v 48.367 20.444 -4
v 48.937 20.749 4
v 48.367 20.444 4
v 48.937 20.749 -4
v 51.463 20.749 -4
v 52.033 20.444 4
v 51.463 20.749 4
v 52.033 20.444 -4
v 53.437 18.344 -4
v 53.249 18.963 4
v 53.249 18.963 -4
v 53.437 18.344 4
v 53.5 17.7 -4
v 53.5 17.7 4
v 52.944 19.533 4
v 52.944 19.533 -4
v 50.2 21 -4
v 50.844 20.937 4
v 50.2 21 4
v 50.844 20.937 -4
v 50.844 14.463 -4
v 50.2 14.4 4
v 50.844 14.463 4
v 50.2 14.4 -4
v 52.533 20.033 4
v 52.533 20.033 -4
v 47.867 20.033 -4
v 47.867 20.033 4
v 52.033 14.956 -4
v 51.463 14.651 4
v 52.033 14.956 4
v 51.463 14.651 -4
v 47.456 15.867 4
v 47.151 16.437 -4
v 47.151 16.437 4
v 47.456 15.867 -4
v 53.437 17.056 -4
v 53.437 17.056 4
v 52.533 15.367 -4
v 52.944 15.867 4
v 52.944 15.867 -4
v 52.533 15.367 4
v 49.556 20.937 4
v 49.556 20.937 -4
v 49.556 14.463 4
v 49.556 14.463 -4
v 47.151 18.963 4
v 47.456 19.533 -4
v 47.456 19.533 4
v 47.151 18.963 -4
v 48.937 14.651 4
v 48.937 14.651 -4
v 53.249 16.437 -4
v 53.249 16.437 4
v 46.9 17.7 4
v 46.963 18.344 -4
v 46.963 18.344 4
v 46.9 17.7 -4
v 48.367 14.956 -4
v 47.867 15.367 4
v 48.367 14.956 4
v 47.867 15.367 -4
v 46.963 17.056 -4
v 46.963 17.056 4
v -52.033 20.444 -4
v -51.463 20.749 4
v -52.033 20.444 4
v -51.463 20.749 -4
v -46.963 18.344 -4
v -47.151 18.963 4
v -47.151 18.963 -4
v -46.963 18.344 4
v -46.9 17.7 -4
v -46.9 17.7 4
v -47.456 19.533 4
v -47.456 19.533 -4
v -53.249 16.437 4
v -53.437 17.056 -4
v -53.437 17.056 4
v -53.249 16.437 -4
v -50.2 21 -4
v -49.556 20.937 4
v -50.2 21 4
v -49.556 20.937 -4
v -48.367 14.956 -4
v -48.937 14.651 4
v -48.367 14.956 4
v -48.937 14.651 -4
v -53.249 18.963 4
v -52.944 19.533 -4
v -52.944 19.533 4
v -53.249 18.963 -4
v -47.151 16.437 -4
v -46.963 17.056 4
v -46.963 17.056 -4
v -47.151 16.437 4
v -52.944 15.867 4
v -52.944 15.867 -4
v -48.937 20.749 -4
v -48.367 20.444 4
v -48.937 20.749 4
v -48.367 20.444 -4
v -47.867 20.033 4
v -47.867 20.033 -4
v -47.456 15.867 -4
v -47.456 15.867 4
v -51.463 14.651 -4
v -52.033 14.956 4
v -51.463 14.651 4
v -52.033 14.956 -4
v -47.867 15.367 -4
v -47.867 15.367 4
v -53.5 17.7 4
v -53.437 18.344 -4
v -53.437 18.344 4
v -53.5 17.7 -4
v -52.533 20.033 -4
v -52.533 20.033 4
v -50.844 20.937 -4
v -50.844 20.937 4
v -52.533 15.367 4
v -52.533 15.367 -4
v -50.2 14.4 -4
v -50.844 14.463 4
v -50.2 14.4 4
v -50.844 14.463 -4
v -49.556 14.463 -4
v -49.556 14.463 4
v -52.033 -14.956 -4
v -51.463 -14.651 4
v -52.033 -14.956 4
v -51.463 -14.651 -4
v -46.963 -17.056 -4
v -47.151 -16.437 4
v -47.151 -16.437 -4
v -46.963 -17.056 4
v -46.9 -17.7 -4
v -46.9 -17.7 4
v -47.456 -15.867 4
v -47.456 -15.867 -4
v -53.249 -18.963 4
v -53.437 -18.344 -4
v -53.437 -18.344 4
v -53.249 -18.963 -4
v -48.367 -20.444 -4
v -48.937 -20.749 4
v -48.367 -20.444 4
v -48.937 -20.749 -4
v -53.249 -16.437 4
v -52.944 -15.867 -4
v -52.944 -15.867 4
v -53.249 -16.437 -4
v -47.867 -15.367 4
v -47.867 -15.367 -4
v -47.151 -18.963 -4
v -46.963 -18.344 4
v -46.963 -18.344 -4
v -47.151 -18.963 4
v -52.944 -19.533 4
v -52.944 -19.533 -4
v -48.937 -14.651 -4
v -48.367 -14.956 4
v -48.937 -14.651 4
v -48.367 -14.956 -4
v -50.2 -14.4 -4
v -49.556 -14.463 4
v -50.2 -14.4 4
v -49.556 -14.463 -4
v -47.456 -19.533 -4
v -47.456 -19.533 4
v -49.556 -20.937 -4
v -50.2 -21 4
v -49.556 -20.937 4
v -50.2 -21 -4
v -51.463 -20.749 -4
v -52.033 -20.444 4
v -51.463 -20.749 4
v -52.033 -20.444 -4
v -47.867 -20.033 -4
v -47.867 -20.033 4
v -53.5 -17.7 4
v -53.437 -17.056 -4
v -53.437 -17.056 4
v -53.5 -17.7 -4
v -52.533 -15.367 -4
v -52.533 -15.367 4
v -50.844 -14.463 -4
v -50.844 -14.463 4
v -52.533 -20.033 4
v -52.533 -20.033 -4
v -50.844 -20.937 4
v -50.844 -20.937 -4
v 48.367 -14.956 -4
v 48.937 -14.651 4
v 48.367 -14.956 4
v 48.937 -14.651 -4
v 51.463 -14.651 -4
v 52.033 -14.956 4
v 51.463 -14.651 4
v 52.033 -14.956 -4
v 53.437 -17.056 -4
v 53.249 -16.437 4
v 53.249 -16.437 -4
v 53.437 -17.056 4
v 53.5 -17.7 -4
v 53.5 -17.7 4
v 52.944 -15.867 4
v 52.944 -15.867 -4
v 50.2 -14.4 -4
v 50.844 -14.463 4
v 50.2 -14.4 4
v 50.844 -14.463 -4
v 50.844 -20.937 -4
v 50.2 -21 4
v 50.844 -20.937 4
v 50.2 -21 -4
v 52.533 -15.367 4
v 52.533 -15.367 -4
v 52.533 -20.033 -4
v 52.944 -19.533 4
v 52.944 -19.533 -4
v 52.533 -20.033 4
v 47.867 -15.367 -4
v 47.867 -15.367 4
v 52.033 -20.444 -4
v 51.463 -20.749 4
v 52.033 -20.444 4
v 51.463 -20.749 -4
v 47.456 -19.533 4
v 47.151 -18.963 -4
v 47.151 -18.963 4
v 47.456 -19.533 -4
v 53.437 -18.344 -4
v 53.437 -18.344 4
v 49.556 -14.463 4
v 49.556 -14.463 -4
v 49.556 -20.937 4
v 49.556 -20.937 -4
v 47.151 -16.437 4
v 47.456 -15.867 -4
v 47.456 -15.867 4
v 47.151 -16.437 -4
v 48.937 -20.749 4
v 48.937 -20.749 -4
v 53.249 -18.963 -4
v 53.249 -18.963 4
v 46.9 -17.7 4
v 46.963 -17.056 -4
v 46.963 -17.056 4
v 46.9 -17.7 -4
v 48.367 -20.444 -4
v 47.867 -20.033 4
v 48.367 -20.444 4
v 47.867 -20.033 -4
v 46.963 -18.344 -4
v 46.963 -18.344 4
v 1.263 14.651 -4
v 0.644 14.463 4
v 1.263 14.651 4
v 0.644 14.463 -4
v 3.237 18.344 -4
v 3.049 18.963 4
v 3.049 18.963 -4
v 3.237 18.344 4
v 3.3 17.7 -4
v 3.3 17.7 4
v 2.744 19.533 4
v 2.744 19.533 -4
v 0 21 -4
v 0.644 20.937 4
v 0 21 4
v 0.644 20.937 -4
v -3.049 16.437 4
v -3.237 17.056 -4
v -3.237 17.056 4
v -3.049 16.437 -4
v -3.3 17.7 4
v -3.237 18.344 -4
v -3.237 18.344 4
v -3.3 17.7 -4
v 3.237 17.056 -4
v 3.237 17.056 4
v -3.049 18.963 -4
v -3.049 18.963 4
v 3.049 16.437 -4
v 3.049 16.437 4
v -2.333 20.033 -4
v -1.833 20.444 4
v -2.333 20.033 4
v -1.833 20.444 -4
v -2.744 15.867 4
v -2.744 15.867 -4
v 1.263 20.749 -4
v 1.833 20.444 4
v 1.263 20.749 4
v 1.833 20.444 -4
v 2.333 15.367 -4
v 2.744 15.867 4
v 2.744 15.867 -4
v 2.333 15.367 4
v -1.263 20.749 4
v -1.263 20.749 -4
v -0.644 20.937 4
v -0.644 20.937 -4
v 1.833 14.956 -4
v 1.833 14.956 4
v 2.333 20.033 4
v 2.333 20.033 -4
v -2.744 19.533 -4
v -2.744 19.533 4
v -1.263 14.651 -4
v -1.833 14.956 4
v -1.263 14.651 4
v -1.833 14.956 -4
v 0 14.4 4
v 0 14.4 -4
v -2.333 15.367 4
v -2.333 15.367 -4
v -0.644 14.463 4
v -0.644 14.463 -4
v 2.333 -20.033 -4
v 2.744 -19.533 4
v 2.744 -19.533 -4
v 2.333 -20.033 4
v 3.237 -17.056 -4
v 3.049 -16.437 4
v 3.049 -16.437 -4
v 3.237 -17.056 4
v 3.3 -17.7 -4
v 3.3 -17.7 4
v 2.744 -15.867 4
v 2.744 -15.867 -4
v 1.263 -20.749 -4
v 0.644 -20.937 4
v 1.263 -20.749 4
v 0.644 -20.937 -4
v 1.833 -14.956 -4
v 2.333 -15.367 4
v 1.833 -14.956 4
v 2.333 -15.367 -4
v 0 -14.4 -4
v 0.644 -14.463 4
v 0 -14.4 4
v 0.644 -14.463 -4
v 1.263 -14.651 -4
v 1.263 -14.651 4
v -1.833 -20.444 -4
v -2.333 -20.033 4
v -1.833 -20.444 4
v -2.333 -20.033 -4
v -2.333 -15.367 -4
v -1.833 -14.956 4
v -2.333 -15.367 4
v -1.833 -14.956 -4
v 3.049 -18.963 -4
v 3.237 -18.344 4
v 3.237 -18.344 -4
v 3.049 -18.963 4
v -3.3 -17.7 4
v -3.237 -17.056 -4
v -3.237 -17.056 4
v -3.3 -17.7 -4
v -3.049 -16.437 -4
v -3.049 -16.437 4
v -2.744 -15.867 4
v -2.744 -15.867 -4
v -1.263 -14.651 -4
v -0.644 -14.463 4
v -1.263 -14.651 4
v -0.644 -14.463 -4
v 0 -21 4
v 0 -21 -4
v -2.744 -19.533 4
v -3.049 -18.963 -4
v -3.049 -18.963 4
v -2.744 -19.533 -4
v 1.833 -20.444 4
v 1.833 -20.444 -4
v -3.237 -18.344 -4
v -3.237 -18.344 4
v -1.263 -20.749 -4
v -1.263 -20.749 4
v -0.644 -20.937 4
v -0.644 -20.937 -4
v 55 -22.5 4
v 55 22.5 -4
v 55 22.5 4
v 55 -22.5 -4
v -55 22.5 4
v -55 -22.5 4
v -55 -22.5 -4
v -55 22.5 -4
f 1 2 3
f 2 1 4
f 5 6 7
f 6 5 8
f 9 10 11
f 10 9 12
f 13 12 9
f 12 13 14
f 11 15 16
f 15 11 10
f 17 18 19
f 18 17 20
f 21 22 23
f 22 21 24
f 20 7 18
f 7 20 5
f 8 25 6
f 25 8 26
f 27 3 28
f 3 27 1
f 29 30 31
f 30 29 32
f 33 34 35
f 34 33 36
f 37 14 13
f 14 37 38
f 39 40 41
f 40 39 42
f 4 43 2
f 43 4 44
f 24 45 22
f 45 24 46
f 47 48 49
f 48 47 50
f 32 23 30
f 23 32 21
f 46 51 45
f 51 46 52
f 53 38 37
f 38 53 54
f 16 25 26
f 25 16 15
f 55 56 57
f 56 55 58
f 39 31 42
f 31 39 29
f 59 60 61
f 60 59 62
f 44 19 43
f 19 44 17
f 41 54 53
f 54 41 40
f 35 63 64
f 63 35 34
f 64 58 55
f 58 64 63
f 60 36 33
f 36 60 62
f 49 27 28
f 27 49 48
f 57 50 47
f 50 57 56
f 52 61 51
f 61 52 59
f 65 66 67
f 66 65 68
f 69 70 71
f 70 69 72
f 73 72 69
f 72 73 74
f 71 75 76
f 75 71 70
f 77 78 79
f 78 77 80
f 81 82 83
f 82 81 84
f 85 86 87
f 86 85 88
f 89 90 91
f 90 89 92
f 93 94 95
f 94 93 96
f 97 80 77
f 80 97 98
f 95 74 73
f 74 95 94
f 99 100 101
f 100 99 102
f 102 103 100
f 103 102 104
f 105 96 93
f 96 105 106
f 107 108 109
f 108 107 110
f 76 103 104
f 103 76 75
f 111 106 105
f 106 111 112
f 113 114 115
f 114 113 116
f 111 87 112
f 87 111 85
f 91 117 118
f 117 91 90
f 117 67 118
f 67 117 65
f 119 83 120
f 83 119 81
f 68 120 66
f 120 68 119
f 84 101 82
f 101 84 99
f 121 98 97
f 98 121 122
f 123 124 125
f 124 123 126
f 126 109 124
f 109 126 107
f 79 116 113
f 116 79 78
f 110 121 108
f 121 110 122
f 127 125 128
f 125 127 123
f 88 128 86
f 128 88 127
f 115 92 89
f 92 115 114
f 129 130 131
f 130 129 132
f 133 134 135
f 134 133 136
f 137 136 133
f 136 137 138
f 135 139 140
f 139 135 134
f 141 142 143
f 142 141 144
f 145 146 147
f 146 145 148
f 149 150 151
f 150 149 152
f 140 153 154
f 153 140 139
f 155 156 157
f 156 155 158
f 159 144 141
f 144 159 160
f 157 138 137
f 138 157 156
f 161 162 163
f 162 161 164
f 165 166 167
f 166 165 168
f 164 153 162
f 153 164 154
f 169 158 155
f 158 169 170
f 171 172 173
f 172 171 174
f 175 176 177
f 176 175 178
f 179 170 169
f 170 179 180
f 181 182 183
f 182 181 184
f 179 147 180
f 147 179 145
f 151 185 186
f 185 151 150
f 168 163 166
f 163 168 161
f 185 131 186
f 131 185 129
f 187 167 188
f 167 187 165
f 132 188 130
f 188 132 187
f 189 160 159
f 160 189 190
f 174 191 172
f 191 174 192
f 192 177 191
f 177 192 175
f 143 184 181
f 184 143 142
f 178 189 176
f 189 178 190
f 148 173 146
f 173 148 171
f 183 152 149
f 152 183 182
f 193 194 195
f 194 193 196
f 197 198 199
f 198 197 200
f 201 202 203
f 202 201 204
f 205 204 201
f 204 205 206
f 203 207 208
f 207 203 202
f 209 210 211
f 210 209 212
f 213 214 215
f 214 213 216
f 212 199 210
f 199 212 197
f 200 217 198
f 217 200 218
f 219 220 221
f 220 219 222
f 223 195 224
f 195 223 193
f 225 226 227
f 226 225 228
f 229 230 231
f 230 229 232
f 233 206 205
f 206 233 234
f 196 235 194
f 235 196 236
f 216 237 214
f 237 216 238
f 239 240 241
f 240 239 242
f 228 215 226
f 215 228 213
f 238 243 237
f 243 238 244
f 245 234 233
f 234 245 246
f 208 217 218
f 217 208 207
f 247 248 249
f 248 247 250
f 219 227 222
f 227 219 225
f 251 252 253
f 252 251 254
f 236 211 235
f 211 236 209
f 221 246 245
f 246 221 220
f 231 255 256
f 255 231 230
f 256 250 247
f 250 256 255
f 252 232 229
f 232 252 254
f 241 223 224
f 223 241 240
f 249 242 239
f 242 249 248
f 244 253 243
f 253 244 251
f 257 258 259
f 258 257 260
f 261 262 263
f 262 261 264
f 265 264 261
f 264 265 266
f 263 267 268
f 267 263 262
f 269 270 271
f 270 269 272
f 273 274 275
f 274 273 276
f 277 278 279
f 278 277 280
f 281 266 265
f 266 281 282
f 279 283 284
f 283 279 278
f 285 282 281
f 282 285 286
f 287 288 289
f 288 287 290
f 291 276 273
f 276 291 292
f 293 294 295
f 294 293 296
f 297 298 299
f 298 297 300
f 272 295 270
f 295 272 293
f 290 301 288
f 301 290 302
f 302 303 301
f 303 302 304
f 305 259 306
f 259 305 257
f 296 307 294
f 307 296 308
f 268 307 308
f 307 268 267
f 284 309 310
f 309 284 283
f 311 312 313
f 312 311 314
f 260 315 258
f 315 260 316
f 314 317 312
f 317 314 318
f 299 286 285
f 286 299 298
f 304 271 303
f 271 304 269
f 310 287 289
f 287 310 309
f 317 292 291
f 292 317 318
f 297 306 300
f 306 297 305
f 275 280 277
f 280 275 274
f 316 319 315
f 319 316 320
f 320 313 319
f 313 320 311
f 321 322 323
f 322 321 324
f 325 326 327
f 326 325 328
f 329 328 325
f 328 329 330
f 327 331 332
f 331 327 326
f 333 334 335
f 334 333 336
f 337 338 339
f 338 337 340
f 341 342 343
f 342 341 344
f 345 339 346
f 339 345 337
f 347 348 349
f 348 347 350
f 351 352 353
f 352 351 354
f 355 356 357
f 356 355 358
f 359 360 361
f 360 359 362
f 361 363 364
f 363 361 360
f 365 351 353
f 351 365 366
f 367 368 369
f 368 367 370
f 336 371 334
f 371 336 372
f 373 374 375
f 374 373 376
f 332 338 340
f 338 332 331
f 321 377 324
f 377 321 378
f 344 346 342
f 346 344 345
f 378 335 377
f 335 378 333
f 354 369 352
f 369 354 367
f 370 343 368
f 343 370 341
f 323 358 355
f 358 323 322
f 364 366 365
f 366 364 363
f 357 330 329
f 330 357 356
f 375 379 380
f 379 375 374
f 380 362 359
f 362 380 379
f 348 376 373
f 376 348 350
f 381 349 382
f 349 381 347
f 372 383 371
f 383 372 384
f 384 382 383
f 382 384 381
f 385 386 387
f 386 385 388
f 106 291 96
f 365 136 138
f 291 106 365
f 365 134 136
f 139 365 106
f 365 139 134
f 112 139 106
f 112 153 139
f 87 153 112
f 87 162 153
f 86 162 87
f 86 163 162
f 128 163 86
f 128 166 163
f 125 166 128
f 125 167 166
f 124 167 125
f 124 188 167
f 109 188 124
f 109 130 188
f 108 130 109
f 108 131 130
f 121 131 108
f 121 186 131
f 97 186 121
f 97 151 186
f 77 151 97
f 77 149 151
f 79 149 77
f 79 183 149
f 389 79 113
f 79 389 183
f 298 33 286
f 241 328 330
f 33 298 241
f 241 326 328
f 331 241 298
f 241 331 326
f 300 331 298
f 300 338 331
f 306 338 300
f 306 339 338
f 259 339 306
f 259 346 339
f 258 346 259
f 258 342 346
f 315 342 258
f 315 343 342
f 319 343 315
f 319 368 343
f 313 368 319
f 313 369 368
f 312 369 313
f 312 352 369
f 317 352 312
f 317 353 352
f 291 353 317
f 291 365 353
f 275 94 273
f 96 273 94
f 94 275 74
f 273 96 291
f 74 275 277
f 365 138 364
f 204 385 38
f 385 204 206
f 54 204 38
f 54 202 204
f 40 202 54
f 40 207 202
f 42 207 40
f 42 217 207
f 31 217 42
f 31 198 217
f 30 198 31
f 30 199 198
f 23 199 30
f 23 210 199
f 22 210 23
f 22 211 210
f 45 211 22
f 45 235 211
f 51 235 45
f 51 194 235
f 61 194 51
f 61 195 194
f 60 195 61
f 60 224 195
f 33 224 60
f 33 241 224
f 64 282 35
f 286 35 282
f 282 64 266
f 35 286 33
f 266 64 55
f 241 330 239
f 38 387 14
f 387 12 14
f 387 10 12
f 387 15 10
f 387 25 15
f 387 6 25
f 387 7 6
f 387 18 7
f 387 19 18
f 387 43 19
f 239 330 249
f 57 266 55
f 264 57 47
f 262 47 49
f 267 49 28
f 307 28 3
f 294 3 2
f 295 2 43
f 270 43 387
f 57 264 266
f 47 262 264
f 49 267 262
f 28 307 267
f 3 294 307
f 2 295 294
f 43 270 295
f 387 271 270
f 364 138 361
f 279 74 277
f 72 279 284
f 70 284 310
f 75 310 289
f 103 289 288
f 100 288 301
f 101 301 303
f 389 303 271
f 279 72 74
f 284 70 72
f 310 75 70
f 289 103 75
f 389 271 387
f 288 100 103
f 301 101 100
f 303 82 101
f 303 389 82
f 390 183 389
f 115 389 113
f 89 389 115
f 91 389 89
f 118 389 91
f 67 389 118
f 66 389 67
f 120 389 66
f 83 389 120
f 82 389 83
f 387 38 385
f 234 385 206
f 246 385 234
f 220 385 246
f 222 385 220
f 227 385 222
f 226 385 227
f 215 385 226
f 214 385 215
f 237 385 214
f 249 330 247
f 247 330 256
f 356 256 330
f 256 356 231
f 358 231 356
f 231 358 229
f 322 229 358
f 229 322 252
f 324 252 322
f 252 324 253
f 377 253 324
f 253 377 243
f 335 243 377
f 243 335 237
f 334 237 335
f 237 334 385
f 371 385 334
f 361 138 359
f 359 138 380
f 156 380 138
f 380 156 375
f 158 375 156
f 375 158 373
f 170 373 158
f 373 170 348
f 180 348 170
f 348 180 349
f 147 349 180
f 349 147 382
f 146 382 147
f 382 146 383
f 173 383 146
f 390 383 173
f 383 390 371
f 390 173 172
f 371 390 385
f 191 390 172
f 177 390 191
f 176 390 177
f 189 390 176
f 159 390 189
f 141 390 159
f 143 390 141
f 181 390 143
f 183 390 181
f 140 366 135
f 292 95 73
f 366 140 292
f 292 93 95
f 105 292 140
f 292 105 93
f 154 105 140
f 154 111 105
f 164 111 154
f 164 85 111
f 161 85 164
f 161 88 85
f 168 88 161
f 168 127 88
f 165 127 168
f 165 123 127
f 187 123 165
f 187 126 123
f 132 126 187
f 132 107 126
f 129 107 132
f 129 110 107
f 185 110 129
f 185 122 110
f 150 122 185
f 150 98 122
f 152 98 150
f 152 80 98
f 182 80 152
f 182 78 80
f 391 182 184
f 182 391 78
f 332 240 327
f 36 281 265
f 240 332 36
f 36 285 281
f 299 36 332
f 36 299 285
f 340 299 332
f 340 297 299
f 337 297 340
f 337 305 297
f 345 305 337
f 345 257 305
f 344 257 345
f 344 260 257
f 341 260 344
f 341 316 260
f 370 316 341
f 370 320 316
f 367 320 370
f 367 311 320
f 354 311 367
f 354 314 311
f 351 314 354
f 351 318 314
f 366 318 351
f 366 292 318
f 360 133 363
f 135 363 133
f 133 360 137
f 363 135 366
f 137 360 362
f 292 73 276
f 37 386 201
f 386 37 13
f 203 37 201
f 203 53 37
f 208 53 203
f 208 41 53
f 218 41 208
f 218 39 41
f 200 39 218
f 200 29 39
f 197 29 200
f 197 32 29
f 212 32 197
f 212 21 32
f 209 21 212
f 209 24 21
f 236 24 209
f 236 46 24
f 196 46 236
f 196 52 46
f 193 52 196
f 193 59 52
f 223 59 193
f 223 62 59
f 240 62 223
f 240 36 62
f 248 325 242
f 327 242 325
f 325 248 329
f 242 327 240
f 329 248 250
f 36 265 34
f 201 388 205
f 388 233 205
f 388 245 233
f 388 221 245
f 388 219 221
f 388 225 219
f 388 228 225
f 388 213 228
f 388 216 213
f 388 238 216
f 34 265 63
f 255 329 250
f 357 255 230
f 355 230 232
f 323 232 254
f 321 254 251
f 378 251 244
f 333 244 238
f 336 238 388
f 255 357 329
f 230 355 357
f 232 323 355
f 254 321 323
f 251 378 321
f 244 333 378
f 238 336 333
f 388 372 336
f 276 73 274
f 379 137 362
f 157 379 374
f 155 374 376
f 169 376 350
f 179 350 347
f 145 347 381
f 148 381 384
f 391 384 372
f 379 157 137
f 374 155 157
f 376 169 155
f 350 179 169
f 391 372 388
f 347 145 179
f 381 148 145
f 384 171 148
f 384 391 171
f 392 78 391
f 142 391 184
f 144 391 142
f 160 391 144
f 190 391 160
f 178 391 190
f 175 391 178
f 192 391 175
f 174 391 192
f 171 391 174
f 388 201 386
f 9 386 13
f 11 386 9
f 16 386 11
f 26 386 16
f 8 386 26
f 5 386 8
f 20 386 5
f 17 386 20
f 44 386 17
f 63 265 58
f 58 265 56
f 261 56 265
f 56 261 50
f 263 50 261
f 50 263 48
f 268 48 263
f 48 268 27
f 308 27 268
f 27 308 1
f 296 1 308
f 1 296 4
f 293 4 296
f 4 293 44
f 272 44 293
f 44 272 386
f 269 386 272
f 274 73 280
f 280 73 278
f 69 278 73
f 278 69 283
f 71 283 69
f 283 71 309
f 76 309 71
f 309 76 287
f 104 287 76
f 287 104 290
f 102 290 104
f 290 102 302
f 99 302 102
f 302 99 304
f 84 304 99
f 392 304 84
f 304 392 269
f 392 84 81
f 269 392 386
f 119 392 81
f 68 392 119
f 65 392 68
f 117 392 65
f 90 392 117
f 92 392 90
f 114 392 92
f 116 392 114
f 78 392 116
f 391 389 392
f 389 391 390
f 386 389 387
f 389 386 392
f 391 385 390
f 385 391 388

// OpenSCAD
$fn = 32;

// ----------------------------------------------------------------------
// Corner plate 110 x 45 x 8
// 6 holes, centres taken from the edge offset
// ----------------------------------------------------------------------

// --- parameters (mm) ---
plate = [110, 45, 8];  // overall size (x, y, z)
holes = 6;             // number of holes the drawing asks for
hole_d = 6.6;          // hole diameter
edge = 4.8;            // hole centre offset from the plate edge

// --- derived feature positions (mm) ---
corner_x = plate[0] / 2 - edge;  // = 50.2   corner hole X
corner_y = plate[1] / 2 - edge;  // = 17.7   corner hole Y
feature_centers = [
  [corner_x, corner_y],
  [-corner_x, corner_y],
  [-corner_x, -corner_y],
  [corner_x, -corner_y],
  [0, corner_y],
  [0, -corner_y]
];   // hole centres the loop below drills

// plate outline, every hole drilled through with the same cutters
difference() {
  cube(plate, center = true);
  for (centre = feature_centers)
    translate([centre[0], centre[1], 0])
      cylinder(d = hole_d, h = plate[2] + 2, center = true);
}
